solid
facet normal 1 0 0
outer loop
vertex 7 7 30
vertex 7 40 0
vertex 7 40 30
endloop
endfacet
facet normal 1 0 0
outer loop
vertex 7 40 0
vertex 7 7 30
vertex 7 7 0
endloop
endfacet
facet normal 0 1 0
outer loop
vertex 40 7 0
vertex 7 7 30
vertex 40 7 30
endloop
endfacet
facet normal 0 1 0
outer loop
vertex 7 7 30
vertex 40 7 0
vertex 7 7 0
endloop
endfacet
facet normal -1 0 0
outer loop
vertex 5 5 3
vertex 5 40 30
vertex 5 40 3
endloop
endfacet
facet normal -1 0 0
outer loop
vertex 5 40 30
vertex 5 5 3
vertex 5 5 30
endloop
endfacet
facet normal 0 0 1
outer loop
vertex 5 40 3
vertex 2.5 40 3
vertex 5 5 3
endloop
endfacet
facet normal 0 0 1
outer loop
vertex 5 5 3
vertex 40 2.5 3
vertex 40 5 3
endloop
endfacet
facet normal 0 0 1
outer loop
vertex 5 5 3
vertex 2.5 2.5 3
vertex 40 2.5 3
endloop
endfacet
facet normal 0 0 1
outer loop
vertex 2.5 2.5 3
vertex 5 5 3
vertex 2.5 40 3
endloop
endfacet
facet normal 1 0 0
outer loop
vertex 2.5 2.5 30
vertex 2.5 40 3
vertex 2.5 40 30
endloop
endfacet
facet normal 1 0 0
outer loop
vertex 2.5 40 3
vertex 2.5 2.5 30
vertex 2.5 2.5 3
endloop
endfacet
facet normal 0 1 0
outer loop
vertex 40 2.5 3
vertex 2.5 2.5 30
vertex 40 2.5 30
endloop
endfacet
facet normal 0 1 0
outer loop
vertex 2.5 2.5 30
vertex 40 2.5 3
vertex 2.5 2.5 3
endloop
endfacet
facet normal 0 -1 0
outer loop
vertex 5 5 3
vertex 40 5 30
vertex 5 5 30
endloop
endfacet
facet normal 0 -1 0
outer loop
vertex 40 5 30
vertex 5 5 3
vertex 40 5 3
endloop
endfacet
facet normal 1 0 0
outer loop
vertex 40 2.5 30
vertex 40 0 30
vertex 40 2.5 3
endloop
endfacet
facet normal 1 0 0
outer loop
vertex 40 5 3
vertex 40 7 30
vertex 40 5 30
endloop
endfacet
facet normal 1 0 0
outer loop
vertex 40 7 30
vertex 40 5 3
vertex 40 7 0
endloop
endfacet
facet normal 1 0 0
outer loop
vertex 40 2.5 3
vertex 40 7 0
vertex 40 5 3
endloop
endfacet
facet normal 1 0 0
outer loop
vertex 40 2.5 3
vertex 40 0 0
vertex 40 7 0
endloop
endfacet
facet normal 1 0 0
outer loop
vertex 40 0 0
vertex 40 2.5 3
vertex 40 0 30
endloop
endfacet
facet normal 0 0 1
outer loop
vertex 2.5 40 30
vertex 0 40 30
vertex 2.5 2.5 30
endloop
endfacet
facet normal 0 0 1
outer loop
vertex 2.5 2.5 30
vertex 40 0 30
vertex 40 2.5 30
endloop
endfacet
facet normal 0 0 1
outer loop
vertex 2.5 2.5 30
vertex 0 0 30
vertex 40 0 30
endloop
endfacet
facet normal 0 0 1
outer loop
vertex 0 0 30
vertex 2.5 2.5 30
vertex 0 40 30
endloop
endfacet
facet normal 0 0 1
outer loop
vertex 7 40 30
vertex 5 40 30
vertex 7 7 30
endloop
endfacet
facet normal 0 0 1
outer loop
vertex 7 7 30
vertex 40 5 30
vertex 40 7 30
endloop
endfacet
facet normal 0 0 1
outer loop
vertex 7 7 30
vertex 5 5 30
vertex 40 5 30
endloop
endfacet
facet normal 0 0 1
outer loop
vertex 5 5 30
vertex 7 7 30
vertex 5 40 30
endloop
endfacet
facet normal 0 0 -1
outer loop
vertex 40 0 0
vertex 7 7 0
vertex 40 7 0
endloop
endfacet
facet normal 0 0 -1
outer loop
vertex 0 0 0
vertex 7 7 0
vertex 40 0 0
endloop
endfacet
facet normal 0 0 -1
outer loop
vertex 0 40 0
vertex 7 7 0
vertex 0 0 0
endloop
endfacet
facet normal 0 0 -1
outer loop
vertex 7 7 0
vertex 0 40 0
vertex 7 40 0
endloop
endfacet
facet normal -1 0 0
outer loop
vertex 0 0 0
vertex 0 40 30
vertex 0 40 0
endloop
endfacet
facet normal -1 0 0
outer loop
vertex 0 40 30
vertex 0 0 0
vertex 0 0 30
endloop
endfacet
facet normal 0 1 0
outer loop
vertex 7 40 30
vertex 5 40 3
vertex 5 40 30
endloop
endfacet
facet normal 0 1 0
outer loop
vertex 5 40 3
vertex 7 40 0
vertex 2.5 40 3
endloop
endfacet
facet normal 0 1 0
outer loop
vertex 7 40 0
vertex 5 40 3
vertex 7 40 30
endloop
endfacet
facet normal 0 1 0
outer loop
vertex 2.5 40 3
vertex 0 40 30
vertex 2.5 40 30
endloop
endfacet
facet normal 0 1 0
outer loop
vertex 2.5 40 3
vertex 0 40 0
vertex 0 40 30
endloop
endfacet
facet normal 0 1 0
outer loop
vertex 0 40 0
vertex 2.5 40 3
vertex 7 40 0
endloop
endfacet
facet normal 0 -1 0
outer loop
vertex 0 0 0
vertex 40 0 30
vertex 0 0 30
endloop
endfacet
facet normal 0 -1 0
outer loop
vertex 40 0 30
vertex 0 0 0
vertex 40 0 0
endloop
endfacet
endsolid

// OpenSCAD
// A simple angle joint to hold 2 acryclic sheets to provide the basic structure
// for the incubator



module bracket(height,sheet_width)
{
	difference()
	{
		union()
		{
			cube([40,40,height]);
		}
		union()
		{
			translate([5+sheet_width,5+sheet_width,-1]) cube([40,40,height+10]);
			//gives the basic angle bracket shape
				
			translate([sheet_width+0.5,sheet_width+0.5,3]) cube ([sheet_width+0.5,40,height]);
			translate([sheet_width+0.5,sheet_width+0.5,3]) cube ([40,sheet_width+0.5,height]);
			//removes the slots for the sheet to go into
		}
	}
}

bracket(30,2);
//by changing the sheet width parameter in the module call above this can be adapted to acrylic sheets of different thicknesses
